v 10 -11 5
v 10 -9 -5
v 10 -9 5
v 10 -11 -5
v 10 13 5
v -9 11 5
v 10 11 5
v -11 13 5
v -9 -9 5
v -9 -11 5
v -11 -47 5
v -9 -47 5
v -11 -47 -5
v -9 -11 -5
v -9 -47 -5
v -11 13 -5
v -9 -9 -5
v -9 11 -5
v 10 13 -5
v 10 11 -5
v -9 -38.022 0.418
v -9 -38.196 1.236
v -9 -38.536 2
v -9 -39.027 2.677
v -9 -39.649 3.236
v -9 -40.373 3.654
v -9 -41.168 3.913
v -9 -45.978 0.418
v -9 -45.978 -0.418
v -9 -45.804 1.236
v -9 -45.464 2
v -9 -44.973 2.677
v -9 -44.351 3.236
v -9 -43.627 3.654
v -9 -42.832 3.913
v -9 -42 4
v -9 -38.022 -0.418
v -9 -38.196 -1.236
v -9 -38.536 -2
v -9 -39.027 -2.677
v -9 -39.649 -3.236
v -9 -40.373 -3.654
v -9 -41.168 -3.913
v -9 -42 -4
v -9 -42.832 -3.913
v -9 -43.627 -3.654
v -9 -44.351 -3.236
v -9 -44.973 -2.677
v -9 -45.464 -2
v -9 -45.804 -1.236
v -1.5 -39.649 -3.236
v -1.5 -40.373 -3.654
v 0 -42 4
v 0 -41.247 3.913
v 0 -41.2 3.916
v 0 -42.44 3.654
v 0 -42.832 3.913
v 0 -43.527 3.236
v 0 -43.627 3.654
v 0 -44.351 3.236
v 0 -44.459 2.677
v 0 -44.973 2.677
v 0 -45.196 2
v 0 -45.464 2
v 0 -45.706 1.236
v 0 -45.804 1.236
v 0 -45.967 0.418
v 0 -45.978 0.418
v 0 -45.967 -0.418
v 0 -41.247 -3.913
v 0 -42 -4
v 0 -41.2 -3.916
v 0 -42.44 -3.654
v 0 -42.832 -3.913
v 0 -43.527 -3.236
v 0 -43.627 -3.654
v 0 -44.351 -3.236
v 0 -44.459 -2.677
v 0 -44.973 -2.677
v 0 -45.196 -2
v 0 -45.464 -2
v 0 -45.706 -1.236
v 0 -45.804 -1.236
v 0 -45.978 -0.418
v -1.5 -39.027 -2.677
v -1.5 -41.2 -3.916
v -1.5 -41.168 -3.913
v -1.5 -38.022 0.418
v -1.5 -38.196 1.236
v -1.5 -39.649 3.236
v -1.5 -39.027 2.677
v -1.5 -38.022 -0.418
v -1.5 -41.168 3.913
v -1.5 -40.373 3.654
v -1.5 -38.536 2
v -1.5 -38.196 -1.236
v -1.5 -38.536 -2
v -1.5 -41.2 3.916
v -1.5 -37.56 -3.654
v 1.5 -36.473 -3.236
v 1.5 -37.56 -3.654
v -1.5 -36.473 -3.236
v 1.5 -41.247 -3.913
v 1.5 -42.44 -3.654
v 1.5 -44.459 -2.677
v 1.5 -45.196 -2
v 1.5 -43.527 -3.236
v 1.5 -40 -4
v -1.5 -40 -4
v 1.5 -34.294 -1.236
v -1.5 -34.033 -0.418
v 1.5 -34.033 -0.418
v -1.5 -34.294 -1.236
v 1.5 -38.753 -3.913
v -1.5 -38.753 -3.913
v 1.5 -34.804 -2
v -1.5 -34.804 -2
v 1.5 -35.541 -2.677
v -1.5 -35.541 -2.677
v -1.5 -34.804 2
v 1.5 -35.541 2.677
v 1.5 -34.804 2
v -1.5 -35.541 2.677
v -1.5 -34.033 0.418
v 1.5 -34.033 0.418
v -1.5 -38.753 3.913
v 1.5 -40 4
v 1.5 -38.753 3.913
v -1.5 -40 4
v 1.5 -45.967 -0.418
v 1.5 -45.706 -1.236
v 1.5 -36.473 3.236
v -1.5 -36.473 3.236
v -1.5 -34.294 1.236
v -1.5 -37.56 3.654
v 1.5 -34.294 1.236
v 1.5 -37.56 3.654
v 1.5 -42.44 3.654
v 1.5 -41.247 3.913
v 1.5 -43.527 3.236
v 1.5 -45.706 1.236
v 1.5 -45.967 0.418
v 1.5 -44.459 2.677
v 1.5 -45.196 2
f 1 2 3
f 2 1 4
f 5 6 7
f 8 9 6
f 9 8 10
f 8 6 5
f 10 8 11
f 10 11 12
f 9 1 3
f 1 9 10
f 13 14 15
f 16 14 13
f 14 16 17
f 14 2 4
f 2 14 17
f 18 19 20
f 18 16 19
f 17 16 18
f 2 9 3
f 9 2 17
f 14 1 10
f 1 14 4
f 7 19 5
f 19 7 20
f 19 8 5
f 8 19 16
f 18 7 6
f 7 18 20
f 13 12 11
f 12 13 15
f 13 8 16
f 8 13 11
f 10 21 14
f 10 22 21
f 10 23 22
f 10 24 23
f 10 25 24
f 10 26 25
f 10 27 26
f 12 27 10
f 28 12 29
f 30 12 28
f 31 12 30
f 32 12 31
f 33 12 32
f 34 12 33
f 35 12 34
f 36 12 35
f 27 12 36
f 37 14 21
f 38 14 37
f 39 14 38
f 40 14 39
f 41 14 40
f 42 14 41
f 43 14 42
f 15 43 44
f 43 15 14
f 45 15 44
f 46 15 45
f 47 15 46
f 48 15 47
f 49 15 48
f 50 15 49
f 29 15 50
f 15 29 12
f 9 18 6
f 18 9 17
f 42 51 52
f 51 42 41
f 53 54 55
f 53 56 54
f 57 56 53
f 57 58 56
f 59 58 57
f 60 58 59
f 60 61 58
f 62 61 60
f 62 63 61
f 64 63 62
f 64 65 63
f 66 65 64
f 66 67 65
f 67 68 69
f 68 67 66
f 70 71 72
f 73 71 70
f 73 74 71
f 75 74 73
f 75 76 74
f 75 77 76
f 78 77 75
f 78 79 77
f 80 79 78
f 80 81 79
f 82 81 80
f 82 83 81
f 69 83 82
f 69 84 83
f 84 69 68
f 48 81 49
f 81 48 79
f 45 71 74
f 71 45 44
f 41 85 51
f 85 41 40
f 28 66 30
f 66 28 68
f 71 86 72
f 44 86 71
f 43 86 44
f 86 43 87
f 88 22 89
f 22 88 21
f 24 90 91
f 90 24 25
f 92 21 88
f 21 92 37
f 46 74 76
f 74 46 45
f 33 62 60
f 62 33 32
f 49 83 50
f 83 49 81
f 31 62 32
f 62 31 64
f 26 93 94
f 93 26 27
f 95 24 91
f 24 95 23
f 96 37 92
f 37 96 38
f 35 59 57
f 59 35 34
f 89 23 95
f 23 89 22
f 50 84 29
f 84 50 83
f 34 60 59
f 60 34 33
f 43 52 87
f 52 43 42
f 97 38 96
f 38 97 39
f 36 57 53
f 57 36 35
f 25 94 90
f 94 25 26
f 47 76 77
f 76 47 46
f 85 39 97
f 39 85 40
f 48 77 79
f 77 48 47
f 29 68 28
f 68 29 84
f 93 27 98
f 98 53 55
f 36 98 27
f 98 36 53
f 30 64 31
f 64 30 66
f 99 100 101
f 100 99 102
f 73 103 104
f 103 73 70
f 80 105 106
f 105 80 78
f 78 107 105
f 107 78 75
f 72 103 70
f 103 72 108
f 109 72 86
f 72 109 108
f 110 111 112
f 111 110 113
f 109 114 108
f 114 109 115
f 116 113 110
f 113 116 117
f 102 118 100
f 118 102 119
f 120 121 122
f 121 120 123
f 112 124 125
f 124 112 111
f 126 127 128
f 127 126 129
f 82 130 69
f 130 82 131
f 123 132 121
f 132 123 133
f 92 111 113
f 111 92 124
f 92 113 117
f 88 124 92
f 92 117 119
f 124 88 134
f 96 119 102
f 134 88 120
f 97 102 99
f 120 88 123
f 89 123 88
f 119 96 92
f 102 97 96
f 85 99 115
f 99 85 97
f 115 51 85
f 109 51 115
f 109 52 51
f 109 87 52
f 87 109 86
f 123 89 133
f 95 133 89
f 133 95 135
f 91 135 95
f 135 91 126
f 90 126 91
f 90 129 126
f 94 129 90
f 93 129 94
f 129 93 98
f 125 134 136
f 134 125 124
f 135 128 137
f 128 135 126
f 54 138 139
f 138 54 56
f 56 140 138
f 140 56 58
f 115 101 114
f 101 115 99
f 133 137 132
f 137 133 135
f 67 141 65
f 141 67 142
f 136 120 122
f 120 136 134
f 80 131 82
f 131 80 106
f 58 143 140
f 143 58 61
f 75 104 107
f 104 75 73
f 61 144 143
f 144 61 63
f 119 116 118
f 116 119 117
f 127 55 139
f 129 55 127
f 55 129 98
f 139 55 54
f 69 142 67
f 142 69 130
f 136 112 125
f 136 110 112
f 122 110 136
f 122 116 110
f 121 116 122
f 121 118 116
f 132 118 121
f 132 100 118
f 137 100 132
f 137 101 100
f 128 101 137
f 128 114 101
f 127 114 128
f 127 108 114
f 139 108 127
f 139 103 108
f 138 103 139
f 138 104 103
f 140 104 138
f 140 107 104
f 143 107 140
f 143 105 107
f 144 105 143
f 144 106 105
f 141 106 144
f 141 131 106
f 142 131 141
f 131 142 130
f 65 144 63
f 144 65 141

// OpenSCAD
$fn=30;

//# translate([0,1,0]) cube([20,20,5],center=true);

translate([0,-10,0])
	cube([20,2,10],center=true);

color("BLUE")
translate([0,12,0])
	cube([20,2,10],center=true);

color("GREEN")
rotate([0,0,90])
	translate([-17,10,0])
	cube([60,2,10],center=true);

	
translate([-5,-42,0])
	rotate([0,90,0])
	cylinder(h=10, r=4, center=true);


translate([0,-40,0])
	rotate([0,90,0])
	scale([1,1.5,1])
	cylinder(h=3, r=4, center=true);
